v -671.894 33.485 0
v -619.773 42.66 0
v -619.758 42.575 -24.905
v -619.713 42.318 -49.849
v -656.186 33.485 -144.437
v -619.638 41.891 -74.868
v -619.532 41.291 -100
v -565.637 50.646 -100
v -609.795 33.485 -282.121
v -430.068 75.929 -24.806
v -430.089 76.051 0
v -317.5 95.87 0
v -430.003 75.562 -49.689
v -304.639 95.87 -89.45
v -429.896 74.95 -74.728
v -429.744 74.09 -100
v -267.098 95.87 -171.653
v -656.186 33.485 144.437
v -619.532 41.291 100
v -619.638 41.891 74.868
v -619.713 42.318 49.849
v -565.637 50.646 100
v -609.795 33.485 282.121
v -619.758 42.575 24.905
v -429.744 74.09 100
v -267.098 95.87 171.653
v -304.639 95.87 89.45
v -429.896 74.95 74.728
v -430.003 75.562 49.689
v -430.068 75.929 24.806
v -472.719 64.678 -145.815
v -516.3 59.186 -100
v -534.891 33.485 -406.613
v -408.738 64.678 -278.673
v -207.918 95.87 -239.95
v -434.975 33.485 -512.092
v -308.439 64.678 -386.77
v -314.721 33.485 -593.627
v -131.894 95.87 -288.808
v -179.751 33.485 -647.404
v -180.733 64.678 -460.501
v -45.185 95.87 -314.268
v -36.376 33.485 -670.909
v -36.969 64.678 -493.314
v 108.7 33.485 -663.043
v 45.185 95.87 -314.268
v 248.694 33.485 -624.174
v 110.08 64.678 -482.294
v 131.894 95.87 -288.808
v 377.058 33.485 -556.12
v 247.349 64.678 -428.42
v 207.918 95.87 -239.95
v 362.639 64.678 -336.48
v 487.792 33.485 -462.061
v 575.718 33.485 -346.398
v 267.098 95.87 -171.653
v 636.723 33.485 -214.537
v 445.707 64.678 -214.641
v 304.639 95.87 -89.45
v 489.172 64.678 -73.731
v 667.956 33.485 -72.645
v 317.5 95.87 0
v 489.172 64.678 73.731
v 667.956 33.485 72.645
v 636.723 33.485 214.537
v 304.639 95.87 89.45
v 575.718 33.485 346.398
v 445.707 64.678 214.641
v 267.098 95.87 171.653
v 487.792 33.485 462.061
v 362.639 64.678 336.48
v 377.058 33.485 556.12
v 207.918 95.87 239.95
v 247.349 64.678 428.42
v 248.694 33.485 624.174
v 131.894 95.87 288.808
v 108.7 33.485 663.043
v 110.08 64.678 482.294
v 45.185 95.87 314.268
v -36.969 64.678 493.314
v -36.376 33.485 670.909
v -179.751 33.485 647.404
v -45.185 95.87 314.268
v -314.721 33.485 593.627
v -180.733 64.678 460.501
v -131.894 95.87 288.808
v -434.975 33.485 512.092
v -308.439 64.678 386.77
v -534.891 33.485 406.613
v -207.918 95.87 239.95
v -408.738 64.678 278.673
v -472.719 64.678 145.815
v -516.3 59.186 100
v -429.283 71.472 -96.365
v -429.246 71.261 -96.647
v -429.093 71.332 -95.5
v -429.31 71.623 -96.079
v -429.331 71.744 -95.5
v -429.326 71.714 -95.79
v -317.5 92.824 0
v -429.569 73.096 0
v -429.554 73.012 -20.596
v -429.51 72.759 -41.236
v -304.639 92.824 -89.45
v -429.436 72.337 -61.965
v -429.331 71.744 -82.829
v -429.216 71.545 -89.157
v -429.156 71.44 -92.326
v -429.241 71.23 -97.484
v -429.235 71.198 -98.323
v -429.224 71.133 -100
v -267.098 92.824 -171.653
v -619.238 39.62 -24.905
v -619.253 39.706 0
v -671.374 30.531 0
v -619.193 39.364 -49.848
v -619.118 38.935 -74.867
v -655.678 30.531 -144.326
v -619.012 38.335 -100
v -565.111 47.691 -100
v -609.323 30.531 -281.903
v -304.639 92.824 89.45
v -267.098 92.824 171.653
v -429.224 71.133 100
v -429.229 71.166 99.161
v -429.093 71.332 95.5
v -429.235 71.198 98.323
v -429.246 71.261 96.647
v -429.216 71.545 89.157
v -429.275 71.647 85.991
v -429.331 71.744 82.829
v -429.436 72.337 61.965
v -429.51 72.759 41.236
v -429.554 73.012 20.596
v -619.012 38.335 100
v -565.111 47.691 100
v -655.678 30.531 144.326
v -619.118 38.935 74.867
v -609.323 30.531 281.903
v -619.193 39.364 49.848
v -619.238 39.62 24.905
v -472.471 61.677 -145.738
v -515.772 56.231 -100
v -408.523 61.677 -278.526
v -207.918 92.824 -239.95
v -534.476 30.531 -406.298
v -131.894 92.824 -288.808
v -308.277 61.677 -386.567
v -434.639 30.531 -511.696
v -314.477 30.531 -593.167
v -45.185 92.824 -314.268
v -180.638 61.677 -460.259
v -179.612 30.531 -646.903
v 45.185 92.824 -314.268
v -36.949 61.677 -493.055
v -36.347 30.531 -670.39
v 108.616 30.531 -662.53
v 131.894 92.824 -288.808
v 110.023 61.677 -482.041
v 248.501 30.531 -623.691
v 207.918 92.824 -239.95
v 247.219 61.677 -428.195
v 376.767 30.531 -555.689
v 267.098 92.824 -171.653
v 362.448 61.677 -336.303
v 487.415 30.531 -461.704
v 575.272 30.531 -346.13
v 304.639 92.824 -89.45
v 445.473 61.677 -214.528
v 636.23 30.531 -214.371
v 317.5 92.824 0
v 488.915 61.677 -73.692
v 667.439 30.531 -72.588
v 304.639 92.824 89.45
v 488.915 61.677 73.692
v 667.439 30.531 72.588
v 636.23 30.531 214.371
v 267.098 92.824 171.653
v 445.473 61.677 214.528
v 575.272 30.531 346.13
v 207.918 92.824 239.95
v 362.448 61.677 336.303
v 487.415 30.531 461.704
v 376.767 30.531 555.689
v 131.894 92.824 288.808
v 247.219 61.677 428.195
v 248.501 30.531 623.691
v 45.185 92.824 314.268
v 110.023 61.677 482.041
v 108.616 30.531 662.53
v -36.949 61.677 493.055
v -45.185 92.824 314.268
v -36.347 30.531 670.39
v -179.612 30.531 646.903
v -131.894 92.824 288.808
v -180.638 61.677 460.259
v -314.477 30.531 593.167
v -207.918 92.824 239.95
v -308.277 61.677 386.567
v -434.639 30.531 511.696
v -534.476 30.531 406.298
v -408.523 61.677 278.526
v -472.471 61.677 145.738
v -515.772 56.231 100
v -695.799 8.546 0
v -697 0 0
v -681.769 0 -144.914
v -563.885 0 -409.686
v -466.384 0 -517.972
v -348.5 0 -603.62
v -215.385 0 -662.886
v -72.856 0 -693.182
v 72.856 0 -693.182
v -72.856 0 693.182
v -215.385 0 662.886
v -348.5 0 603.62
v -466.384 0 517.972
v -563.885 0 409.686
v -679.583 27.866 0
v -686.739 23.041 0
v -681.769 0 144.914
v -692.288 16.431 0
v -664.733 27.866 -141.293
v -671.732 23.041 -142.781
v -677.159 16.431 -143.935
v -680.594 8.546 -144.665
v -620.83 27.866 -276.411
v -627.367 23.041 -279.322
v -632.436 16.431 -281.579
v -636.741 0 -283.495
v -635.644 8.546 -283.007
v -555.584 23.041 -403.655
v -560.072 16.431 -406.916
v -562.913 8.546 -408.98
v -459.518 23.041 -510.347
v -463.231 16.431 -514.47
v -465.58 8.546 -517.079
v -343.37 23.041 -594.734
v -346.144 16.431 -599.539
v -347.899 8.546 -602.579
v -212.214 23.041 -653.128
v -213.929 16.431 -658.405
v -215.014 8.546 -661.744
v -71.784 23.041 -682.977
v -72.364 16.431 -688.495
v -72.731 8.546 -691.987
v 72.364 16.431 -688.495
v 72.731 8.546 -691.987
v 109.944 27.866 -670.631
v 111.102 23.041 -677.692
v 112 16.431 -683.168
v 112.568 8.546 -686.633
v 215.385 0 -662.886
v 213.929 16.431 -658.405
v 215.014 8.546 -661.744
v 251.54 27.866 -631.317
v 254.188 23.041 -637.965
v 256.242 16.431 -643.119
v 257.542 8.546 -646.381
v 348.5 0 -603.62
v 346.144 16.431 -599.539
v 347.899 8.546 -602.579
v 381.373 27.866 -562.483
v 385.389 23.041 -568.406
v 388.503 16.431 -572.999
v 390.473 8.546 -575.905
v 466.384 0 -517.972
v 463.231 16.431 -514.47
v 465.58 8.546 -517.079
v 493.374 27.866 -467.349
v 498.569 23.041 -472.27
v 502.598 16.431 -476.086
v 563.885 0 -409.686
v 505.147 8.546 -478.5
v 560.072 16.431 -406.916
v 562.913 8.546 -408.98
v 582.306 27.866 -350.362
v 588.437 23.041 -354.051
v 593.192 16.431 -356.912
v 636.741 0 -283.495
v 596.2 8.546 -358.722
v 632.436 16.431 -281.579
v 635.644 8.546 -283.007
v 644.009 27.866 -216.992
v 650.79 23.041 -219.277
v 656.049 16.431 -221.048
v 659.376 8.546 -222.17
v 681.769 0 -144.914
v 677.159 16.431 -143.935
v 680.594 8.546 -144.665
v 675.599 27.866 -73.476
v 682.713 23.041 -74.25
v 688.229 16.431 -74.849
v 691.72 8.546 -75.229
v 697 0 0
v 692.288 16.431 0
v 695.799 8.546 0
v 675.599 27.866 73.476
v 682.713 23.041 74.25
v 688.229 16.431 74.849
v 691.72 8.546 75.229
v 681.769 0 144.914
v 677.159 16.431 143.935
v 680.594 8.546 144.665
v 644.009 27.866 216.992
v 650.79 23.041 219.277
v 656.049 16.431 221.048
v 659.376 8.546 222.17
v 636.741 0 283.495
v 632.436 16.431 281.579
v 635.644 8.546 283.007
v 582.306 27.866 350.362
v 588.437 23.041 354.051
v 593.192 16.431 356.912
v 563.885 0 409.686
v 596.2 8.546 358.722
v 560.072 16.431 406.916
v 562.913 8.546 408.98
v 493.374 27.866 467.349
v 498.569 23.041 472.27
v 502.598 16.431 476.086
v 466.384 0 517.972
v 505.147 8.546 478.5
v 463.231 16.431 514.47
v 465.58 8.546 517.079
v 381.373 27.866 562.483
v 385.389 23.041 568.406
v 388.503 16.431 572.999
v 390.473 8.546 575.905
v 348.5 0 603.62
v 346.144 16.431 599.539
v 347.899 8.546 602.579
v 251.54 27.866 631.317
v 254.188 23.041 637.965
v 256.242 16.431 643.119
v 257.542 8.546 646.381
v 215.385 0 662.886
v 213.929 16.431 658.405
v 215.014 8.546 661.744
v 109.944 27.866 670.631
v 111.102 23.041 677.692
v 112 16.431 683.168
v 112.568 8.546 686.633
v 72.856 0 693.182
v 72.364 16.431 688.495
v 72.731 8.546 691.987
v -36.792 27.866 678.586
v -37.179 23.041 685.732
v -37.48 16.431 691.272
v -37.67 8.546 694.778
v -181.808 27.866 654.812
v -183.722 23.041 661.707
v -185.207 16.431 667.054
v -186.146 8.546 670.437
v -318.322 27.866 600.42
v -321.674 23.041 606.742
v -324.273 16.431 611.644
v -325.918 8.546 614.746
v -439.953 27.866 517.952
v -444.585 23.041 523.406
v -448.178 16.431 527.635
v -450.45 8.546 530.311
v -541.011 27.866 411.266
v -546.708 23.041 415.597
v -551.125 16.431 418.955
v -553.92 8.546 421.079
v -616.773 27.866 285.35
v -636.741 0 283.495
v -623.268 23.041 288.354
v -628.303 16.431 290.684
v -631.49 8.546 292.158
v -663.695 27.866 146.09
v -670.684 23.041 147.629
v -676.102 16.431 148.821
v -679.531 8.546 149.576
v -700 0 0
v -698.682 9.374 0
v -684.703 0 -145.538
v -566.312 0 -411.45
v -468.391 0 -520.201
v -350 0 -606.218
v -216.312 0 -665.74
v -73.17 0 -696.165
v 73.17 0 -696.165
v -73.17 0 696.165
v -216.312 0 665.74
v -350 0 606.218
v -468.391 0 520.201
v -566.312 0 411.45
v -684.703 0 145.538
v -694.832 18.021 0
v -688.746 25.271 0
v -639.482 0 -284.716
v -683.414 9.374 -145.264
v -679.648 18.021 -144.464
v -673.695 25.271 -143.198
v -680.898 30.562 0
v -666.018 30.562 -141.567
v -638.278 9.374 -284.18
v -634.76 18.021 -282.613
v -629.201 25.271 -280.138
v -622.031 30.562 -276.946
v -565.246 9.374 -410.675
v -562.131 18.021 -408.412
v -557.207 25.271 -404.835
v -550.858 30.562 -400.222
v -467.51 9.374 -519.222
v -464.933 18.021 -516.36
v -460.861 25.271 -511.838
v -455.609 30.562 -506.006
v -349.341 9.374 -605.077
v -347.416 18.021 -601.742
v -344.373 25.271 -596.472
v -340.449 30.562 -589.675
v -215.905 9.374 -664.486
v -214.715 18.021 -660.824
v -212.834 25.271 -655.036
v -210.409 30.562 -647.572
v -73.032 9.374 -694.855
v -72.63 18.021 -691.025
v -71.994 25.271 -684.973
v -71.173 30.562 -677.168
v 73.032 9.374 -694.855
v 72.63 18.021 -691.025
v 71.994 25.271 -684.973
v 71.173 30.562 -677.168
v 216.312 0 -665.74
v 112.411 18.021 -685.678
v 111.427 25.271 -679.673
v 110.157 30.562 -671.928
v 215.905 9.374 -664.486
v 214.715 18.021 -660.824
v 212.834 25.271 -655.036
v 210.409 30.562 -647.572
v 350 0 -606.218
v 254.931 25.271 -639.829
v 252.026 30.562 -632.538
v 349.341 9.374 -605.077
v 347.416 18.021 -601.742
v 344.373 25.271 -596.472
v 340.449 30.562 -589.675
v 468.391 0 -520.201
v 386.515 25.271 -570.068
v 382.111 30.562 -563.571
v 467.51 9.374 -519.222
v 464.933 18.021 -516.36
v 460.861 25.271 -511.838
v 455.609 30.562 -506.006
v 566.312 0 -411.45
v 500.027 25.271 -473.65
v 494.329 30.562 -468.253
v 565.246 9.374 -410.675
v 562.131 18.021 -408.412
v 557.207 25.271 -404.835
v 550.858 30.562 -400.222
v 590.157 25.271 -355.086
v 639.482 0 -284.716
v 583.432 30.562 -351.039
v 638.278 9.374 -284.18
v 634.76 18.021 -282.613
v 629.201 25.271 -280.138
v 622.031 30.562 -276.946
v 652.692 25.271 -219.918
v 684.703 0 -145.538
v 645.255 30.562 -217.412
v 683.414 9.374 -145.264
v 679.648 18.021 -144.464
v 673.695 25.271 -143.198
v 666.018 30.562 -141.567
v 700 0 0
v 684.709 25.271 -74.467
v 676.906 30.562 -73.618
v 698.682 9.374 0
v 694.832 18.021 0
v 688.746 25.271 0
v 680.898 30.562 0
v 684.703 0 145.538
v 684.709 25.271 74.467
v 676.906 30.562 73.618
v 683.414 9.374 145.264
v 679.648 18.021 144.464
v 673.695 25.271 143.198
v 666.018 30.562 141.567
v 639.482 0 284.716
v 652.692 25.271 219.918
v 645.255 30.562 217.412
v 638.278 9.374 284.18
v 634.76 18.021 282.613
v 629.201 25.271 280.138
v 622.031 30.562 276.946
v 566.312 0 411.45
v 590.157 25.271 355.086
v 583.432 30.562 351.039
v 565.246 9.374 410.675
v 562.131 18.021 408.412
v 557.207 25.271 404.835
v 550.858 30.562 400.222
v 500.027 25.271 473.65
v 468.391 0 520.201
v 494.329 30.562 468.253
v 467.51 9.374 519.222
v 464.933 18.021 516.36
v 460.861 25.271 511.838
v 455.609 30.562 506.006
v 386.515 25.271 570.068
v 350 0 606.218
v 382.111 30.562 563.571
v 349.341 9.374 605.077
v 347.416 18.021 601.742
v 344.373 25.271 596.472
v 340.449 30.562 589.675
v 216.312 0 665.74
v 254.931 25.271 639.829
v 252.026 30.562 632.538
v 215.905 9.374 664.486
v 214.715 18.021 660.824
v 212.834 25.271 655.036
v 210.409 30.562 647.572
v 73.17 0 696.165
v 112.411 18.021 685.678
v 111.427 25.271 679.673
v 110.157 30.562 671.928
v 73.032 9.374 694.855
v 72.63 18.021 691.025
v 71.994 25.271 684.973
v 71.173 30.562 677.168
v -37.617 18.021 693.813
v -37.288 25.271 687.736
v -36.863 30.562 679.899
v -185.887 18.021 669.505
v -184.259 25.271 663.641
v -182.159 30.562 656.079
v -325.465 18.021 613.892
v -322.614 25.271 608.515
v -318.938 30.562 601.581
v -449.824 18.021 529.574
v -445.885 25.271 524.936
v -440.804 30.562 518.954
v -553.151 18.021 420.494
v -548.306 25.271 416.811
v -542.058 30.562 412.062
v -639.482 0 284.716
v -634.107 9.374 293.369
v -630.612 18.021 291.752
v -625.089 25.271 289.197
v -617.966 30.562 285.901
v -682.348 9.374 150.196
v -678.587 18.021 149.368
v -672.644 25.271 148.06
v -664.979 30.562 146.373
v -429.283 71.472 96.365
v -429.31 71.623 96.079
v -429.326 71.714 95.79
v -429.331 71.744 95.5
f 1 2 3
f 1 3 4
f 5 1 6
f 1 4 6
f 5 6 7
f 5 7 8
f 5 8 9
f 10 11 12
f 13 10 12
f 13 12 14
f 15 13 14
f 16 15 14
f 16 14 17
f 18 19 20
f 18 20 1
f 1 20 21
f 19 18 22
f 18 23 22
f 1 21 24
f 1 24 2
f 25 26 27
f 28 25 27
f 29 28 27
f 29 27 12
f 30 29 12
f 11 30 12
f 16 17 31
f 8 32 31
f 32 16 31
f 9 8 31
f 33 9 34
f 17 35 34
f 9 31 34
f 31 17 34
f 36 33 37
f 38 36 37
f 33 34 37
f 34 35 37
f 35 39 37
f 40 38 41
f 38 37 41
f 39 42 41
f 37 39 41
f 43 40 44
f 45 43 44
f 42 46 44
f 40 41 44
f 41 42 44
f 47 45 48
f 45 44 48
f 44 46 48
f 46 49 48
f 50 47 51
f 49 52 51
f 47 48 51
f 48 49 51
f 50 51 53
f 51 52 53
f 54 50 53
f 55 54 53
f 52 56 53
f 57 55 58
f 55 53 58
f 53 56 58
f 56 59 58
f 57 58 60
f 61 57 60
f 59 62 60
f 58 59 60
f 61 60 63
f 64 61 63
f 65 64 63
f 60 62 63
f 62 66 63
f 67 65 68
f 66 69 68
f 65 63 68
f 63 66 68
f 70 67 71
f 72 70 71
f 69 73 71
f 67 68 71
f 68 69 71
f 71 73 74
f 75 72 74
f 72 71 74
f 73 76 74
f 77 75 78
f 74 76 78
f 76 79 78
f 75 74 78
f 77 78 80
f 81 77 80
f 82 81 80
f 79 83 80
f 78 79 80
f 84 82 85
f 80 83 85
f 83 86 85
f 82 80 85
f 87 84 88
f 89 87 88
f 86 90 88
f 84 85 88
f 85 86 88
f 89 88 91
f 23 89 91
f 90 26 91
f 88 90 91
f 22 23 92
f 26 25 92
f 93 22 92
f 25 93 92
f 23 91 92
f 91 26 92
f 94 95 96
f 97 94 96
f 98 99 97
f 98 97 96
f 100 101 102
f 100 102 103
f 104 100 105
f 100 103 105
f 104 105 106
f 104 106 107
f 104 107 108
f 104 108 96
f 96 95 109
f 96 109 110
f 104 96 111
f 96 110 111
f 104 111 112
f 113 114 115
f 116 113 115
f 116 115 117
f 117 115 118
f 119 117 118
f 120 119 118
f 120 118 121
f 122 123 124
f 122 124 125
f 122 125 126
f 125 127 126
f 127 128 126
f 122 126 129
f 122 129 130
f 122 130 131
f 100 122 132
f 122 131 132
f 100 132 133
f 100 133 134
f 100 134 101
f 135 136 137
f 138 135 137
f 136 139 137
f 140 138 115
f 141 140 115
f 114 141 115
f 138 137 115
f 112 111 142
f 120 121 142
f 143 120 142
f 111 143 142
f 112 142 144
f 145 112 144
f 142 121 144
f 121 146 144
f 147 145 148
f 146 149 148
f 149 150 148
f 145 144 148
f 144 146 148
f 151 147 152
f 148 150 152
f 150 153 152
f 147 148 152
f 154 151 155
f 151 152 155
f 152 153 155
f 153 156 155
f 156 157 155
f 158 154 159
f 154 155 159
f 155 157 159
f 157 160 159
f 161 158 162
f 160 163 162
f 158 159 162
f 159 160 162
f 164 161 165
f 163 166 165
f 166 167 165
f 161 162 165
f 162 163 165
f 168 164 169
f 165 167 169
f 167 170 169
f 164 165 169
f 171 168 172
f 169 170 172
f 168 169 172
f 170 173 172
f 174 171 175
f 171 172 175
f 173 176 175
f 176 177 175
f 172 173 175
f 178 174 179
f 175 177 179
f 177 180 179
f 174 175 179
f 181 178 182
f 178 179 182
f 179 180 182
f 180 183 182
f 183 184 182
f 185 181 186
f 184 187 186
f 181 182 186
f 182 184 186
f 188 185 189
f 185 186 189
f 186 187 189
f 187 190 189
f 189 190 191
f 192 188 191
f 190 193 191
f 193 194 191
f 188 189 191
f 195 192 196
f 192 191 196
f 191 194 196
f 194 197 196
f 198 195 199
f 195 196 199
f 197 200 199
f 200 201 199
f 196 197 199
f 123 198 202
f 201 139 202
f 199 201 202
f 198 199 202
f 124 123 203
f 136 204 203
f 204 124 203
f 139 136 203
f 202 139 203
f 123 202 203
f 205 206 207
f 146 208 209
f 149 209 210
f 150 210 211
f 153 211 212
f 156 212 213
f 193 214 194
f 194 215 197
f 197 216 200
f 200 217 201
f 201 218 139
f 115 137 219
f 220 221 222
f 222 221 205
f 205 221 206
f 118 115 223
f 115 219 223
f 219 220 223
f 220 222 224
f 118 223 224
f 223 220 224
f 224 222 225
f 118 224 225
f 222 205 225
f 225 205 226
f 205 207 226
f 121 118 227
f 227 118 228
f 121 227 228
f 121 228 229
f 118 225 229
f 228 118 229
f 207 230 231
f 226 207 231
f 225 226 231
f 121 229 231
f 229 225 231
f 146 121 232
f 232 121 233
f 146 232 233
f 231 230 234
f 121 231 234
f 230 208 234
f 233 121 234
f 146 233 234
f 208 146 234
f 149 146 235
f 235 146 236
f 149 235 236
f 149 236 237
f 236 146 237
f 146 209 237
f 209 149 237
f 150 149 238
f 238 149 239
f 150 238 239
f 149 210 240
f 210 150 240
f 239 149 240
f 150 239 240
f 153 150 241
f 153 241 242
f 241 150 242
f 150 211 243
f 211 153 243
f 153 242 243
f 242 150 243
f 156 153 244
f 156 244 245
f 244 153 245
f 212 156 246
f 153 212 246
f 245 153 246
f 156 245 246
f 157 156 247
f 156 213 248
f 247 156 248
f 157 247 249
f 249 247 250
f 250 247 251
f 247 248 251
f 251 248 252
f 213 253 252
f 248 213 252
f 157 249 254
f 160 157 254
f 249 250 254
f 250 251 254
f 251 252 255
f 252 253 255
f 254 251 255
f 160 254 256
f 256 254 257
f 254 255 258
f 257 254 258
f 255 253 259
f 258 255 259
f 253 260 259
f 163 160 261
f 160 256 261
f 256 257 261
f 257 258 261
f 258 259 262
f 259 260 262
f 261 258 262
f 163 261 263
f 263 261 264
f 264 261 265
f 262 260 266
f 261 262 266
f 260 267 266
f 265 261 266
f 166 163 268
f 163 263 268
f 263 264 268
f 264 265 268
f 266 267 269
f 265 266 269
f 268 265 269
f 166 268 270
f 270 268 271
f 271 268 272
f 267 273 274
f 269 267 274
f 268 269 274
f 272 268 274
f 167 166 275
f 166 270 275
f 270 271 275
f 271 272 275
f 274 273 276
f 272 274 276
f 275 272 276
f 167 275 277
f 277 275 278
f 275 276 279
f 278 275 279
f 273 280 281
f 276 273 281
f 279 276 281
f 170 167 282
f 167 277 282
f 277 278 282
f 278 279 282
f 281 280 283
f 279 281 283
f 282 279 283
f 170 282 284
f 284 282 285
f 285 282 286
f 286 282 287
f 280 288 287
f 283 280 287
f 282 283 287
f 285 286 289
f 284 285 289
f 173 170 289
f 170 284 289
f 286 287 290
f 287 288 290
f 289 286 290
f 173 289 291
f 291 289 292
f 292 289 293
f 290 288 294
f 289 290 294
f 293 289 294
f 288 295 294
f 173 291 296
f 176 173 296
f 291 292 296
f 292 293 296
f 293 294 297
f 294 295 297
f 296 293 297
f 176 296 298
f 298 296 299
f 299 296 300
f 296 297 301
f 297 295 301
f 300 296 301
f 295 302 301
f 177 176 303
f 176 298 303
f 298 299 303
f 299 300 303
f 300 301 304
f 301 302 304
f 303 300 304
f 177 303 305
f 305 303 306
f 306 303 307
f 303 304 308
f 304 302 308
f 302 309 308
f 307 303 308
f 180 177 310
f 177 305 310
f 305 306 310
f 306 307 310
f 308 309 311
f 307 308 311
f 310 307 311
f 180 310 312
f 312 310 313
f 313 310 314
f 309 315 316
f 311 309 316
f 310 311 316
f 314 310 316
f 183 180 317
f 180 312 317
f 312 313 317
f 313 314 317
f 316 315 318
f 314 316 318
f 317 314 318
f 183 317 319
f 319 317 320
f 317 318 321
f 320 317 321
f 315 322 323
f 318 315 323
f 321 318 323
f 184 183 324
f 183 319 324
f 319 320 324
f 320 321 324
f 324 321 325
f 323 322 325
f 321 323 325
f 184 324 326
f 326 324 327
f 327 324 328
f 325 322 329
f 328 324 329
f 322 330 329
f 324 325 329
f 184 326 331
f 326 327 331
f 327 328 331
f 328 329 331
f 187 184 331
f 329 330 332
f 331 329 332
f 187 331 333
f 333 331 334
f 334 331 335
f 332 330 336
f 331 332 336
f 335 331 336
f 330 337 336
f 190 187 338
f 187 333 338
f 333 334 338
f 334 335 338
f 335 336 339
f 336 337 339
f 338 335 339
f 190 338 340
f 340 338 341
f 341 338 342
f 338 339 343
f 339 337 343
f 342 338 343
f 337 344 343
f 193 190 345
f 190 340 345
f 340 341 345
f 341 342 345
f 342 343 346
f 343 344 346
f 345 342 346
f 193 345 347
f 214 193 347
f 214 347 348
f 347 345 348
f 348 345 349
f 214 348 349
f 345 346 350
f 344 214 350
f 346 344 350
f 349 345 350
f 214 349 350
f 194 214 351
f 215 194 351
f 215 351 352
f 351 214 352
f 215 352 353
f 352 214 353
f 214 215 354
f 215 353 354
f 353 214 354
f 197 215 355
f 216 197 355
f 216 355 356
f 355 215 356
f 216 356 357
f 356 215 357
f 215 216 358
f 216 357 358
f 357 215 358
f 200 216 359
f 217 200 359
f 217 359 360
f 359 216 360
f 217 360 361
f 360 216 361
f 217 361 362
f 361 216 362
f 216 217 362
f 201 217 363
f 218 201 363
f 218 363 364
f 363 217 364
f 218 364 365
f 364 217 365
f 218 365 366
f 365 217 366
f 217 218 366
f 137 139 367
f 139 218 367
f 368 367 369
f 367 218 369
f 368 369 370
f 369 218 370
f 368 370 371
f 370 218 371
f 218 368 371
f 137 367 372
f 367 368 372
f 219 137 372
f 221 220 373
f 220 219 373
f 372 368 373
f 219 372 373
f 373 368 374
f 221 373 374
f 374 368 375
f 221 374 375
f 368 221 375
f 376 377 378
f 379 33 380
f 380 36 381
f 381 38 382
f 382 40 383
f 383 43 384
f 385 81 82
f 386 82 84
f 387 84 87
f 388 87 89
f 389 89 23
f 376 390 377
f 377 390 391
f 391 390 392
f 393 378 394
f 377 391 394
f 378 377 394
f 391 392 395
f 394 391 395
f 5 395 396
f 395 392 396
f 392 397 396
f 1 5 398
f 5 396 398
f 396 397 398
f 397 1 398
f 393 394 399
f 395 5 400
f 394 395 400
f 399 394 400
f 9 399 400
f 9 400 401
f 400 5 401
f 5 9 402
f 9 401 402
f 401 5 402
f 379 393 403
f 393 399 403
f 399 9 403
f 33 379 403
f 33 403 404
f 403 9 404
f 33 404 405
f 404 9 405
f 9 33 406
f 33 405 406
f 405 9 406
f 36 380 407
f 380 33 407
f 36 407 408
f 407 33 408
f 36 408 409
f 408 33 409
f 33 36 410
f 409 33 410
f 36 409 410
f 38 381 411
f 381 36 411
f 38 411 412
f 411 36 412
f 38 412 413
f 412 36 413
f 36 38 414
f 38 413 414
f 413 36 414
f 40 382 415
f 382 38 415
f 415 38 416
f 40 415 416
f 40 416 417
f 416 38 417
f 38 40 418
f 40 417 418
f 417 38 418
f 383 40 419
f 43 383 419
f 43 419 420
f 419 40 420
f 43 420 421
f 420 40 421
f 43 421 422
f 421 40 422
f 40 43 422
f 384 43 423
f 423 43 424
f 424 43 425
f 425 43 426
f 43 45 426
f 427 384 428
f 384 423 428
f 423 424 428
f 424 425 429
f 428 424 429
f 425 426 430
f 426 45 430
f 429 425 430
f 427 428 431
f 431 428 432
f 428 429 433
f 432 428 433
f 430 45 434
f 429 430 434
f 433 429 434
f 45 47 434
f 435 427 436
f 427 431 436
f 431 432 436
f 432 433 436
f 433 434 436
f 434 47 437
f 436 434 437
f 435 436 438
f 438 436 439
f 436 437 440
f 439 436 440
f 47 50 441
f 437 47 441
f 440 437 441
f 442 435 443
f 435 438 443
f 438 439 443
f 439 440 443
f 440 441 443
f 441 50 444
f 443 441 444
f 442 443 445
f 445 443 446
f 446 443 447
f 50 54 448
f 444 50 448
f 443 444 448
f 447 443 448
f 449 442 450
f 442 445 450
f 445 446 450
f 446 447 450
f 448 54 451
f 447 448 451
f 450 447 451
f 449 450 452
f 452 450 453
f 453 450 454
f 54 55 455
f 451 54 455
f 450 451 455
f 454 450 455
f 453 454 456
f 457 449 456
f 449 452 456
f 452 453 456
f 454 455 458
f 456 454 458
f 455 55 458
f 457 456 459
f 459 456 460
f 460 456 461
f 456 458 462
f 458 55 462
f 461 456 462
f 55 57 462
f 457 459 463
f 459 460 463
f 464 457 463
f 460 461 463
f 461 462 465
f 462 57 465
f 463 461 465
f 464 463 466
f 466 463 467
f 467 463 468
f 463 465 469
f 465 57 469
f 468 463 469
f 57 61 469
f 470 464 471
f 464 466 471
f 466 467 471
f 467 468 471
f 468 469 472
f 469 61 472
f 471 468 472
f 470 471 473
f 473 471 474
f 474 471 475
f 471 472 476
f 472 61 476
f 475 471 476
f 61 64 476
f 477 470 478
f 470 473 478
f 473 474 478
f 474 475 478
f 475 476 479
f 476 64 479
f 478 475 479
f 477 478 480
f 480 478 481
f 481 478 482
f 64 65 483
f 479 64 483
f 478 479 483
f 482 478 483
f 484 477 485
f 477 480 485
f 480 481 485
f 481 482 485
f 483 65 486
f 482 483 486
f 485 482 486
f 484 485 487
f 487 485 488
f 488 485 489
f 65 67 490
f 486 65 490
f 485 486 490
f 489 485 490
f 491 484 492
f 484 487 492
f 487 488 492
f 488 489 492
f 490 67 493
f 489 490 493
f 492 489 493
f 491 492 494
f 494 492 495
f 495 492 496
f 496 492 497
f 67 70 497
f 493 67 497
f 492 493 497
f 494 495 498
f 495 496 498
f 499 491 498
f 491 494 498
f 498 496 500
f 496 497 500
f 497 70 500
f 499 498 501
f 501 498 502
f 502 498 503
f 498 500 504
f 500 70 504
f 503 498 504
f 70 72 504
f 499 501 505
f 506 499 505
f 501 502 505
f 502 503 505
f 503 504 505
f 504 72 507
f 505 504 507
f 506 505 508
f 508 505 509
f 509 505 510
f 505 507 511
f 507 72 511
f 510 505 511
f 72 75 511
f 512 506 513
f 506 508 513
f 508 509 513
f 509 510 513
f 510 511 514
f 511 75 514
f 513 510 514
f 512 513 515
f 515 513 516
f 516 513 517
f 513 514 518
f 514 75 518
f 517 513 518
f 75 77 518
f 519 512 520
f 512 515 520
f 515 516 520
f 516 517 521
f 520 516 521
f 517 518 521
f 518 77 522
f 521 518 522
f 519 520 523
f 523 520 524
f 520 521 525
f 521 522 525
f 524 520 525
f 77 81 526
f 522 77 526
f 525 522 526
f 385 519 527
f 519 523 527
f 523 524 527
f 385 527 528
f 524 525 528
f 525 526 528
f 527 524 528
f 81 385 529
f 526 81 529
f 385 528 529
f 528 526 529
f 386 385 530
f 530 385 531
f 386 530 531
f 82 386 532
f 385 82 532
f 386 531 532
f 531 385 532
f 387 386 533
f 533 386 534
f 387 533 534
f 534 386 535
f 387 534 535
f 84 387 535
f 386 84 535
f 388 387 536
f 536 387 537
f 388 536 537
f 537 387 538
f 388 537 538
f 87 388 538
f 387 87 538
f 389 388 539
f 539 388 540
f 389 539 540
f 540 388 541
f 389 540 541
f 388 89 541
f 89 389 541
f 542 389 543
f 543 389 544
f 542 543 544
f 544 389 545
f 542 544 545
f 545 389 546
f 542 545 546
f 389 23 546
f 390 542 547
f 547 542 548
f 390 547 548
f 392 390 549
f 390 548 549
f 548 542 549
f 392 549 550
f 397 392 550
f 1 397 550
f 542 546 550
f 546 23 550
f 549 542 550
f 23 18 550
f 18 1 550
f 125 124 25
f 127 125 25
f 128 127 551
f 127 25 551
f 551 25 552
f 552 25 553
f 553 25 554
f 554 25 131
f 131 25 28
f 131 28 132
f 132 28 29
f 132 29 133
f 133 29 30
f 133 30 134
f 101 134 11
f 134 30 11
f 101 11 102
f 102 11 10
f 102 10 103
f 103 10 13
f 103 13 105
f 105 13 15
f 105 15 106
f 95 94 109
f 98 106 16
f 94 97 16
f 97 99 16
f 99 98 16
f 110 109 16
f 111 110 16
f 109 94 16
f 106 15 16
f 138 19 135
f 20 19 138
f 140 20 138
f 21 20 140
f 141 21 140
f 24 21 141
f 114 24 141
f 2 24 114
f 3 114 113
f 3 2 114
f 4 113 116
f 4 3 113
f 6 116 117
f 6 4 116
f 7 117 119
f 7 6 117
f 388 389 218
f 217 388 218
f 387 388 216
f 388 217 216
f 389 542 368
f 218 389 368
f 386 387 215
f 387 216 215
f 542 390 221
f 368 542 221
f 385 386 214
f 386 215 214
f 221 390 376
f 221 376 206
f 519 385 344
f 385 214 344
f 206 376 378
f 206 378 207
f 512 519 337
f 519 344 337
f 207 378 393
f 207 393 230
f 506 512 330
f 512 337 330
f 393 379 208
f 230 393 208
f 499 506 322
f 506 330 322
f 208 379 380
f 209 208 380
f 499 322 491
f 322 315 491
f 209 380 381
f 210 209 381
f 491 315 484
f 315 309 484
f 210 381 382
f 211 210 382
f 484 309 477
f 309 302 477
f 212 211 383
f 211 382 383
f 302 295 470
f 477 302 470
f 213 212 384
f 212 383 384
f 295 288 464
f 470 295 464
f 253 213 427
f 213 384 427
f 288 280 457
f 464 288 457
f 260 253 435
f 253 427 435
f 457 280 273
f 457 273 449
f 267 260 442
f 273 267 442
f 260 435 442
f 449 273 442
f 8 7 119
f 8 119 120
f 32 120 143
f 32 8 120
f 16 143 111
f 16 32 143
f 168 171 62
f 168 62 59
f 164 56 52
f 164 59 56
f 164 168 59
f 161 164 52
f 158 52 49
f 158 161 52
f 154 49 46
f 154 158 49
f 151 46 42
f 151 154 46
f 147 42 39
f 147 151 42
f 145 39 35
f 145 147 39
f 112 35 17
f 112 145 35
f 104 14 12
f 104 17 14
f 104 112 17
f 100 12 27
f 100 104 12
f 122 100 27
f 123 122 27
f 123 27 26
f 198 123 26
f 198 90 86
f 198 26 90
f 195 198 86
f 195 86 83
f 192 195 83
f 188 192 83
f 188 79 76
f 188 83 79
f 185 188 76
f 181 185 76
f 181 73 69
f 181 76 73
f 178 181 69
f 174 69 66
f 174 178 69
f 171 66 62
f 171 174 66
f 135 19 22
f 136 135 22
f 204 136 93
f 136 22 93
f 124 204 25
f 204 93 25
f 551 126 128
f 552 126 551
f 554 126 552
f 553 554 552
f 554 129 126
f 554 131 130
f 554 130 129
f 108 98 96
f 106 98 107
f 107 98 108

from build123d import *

# Parameters (mm, degrees)
SKETCH_2_R          = 317.5
CUT_EXTRUDE_2_DEPTH = 151
CUT_EXTRUDE_3_DEPTH = 772.950427912
SKETCH_4_W          = 192.600523864
SKETCH_4_H          = 200
CUT_EXTRUDE_4_DEPTH = 5


with BuildPart() as part:
    # Эскиз1 → Повернуть1 (revolve)
    with BuildSketch(Plane.XY):
        with BuildLine():
            Line((-671.894470109, 33.485149277), (-10, 150))
            Line((-10, 150), (-9.479899696, 147.045428005))
            Line((-9.479899696, 147.045428005), (-671.374369805, 30.530577282))
            ThreePointArc((-671.374369805, 30.530577282), (-689.74453057, 19.929808529), (-697, 0))
            Line((-697, 0), (-700, 0))
            ThreePointArc((-700, 0), (-692.042388367, 21.858499677), (-671.894470109, 33.485149277))
        make_face()
    revolve(axis=Axis((0, 73.50481492, 0), (0, -1, 0)))

    # Эскиз2 → Вырез-Вытянуть2 (cut, through all)
    with BuildSketch(Plane(origin=(0, 0, 0), x_dir=(1, 0, 0), z_dir=(0, 1, 0))):
        Circle(SKETCH_2_R)
    extrude(amount=CUT_EXTRUDE_2_DEPTH, mode=Mode.SUBTRACT)

    # Эскиз3 → Вырез-Вытянуть3 (cut, through all)
    with BuildSketch(Plane(origin=(-210.975213956, 365.419789709, 0), x_dir=(-0.866025404, -0.5, 0), z_dir=(0.5, -0.866025404, 0))):
        with BuildLine():
            Line((335.939579419, 95.5), (335.939579419, -95.5))
            ThreePointArc((335.939579419, -95.5), (337.111152294, -98.328427125), (339.939579419, -99.5))
            Line((339.939579419, -99.5), (425.439579419, -99.5))
            Line((425.439579419, -99.5), (510.939579419, -99.5))
            ThreePointArc((510.939579419, -99.5), (513.768006544, -98.328427125), (514.939579419, -95.5))
            Line((514.939579419, -95.5), (514.939579419, 95.5))
            ThreePointArc((514.939579419, 95.5), (513.768006544, 98.328427125), (510.939579419, 99.5))
            Line((510.939579419, 99.5), (425.439579419, 99.5))
            Line((425.439579419, 99.5), (339.939579419, 99.5))
            ThreePointArc((339.939579419, 99.5), (337.111152294, 98.328427125), (335.939579419, 95.5))
        make_face()
    extrude(amount=CUT_EXTRUDE_3_DEPTH, mode=Mode.SUBTRACT)

    # Эскиз4 → Вырез-Вытянуть4 (cut)
    with BuildSketch(Plane(origin=(-25.91179023, 147.199009892, 0), x_dir=(0.984857332, 0.173366768, 0), z_dir=(-0.173366768, 0.984857332, 0))):
        with Locations((-506.692199983, 0)):
            Rectangle(SKETCH_4_W, SKETCH_4_H)
    extrude(amount=-CUT_EXTRUDE_4_DEPTH, mode=Mode.SUBTRACT)


solid = part.part
